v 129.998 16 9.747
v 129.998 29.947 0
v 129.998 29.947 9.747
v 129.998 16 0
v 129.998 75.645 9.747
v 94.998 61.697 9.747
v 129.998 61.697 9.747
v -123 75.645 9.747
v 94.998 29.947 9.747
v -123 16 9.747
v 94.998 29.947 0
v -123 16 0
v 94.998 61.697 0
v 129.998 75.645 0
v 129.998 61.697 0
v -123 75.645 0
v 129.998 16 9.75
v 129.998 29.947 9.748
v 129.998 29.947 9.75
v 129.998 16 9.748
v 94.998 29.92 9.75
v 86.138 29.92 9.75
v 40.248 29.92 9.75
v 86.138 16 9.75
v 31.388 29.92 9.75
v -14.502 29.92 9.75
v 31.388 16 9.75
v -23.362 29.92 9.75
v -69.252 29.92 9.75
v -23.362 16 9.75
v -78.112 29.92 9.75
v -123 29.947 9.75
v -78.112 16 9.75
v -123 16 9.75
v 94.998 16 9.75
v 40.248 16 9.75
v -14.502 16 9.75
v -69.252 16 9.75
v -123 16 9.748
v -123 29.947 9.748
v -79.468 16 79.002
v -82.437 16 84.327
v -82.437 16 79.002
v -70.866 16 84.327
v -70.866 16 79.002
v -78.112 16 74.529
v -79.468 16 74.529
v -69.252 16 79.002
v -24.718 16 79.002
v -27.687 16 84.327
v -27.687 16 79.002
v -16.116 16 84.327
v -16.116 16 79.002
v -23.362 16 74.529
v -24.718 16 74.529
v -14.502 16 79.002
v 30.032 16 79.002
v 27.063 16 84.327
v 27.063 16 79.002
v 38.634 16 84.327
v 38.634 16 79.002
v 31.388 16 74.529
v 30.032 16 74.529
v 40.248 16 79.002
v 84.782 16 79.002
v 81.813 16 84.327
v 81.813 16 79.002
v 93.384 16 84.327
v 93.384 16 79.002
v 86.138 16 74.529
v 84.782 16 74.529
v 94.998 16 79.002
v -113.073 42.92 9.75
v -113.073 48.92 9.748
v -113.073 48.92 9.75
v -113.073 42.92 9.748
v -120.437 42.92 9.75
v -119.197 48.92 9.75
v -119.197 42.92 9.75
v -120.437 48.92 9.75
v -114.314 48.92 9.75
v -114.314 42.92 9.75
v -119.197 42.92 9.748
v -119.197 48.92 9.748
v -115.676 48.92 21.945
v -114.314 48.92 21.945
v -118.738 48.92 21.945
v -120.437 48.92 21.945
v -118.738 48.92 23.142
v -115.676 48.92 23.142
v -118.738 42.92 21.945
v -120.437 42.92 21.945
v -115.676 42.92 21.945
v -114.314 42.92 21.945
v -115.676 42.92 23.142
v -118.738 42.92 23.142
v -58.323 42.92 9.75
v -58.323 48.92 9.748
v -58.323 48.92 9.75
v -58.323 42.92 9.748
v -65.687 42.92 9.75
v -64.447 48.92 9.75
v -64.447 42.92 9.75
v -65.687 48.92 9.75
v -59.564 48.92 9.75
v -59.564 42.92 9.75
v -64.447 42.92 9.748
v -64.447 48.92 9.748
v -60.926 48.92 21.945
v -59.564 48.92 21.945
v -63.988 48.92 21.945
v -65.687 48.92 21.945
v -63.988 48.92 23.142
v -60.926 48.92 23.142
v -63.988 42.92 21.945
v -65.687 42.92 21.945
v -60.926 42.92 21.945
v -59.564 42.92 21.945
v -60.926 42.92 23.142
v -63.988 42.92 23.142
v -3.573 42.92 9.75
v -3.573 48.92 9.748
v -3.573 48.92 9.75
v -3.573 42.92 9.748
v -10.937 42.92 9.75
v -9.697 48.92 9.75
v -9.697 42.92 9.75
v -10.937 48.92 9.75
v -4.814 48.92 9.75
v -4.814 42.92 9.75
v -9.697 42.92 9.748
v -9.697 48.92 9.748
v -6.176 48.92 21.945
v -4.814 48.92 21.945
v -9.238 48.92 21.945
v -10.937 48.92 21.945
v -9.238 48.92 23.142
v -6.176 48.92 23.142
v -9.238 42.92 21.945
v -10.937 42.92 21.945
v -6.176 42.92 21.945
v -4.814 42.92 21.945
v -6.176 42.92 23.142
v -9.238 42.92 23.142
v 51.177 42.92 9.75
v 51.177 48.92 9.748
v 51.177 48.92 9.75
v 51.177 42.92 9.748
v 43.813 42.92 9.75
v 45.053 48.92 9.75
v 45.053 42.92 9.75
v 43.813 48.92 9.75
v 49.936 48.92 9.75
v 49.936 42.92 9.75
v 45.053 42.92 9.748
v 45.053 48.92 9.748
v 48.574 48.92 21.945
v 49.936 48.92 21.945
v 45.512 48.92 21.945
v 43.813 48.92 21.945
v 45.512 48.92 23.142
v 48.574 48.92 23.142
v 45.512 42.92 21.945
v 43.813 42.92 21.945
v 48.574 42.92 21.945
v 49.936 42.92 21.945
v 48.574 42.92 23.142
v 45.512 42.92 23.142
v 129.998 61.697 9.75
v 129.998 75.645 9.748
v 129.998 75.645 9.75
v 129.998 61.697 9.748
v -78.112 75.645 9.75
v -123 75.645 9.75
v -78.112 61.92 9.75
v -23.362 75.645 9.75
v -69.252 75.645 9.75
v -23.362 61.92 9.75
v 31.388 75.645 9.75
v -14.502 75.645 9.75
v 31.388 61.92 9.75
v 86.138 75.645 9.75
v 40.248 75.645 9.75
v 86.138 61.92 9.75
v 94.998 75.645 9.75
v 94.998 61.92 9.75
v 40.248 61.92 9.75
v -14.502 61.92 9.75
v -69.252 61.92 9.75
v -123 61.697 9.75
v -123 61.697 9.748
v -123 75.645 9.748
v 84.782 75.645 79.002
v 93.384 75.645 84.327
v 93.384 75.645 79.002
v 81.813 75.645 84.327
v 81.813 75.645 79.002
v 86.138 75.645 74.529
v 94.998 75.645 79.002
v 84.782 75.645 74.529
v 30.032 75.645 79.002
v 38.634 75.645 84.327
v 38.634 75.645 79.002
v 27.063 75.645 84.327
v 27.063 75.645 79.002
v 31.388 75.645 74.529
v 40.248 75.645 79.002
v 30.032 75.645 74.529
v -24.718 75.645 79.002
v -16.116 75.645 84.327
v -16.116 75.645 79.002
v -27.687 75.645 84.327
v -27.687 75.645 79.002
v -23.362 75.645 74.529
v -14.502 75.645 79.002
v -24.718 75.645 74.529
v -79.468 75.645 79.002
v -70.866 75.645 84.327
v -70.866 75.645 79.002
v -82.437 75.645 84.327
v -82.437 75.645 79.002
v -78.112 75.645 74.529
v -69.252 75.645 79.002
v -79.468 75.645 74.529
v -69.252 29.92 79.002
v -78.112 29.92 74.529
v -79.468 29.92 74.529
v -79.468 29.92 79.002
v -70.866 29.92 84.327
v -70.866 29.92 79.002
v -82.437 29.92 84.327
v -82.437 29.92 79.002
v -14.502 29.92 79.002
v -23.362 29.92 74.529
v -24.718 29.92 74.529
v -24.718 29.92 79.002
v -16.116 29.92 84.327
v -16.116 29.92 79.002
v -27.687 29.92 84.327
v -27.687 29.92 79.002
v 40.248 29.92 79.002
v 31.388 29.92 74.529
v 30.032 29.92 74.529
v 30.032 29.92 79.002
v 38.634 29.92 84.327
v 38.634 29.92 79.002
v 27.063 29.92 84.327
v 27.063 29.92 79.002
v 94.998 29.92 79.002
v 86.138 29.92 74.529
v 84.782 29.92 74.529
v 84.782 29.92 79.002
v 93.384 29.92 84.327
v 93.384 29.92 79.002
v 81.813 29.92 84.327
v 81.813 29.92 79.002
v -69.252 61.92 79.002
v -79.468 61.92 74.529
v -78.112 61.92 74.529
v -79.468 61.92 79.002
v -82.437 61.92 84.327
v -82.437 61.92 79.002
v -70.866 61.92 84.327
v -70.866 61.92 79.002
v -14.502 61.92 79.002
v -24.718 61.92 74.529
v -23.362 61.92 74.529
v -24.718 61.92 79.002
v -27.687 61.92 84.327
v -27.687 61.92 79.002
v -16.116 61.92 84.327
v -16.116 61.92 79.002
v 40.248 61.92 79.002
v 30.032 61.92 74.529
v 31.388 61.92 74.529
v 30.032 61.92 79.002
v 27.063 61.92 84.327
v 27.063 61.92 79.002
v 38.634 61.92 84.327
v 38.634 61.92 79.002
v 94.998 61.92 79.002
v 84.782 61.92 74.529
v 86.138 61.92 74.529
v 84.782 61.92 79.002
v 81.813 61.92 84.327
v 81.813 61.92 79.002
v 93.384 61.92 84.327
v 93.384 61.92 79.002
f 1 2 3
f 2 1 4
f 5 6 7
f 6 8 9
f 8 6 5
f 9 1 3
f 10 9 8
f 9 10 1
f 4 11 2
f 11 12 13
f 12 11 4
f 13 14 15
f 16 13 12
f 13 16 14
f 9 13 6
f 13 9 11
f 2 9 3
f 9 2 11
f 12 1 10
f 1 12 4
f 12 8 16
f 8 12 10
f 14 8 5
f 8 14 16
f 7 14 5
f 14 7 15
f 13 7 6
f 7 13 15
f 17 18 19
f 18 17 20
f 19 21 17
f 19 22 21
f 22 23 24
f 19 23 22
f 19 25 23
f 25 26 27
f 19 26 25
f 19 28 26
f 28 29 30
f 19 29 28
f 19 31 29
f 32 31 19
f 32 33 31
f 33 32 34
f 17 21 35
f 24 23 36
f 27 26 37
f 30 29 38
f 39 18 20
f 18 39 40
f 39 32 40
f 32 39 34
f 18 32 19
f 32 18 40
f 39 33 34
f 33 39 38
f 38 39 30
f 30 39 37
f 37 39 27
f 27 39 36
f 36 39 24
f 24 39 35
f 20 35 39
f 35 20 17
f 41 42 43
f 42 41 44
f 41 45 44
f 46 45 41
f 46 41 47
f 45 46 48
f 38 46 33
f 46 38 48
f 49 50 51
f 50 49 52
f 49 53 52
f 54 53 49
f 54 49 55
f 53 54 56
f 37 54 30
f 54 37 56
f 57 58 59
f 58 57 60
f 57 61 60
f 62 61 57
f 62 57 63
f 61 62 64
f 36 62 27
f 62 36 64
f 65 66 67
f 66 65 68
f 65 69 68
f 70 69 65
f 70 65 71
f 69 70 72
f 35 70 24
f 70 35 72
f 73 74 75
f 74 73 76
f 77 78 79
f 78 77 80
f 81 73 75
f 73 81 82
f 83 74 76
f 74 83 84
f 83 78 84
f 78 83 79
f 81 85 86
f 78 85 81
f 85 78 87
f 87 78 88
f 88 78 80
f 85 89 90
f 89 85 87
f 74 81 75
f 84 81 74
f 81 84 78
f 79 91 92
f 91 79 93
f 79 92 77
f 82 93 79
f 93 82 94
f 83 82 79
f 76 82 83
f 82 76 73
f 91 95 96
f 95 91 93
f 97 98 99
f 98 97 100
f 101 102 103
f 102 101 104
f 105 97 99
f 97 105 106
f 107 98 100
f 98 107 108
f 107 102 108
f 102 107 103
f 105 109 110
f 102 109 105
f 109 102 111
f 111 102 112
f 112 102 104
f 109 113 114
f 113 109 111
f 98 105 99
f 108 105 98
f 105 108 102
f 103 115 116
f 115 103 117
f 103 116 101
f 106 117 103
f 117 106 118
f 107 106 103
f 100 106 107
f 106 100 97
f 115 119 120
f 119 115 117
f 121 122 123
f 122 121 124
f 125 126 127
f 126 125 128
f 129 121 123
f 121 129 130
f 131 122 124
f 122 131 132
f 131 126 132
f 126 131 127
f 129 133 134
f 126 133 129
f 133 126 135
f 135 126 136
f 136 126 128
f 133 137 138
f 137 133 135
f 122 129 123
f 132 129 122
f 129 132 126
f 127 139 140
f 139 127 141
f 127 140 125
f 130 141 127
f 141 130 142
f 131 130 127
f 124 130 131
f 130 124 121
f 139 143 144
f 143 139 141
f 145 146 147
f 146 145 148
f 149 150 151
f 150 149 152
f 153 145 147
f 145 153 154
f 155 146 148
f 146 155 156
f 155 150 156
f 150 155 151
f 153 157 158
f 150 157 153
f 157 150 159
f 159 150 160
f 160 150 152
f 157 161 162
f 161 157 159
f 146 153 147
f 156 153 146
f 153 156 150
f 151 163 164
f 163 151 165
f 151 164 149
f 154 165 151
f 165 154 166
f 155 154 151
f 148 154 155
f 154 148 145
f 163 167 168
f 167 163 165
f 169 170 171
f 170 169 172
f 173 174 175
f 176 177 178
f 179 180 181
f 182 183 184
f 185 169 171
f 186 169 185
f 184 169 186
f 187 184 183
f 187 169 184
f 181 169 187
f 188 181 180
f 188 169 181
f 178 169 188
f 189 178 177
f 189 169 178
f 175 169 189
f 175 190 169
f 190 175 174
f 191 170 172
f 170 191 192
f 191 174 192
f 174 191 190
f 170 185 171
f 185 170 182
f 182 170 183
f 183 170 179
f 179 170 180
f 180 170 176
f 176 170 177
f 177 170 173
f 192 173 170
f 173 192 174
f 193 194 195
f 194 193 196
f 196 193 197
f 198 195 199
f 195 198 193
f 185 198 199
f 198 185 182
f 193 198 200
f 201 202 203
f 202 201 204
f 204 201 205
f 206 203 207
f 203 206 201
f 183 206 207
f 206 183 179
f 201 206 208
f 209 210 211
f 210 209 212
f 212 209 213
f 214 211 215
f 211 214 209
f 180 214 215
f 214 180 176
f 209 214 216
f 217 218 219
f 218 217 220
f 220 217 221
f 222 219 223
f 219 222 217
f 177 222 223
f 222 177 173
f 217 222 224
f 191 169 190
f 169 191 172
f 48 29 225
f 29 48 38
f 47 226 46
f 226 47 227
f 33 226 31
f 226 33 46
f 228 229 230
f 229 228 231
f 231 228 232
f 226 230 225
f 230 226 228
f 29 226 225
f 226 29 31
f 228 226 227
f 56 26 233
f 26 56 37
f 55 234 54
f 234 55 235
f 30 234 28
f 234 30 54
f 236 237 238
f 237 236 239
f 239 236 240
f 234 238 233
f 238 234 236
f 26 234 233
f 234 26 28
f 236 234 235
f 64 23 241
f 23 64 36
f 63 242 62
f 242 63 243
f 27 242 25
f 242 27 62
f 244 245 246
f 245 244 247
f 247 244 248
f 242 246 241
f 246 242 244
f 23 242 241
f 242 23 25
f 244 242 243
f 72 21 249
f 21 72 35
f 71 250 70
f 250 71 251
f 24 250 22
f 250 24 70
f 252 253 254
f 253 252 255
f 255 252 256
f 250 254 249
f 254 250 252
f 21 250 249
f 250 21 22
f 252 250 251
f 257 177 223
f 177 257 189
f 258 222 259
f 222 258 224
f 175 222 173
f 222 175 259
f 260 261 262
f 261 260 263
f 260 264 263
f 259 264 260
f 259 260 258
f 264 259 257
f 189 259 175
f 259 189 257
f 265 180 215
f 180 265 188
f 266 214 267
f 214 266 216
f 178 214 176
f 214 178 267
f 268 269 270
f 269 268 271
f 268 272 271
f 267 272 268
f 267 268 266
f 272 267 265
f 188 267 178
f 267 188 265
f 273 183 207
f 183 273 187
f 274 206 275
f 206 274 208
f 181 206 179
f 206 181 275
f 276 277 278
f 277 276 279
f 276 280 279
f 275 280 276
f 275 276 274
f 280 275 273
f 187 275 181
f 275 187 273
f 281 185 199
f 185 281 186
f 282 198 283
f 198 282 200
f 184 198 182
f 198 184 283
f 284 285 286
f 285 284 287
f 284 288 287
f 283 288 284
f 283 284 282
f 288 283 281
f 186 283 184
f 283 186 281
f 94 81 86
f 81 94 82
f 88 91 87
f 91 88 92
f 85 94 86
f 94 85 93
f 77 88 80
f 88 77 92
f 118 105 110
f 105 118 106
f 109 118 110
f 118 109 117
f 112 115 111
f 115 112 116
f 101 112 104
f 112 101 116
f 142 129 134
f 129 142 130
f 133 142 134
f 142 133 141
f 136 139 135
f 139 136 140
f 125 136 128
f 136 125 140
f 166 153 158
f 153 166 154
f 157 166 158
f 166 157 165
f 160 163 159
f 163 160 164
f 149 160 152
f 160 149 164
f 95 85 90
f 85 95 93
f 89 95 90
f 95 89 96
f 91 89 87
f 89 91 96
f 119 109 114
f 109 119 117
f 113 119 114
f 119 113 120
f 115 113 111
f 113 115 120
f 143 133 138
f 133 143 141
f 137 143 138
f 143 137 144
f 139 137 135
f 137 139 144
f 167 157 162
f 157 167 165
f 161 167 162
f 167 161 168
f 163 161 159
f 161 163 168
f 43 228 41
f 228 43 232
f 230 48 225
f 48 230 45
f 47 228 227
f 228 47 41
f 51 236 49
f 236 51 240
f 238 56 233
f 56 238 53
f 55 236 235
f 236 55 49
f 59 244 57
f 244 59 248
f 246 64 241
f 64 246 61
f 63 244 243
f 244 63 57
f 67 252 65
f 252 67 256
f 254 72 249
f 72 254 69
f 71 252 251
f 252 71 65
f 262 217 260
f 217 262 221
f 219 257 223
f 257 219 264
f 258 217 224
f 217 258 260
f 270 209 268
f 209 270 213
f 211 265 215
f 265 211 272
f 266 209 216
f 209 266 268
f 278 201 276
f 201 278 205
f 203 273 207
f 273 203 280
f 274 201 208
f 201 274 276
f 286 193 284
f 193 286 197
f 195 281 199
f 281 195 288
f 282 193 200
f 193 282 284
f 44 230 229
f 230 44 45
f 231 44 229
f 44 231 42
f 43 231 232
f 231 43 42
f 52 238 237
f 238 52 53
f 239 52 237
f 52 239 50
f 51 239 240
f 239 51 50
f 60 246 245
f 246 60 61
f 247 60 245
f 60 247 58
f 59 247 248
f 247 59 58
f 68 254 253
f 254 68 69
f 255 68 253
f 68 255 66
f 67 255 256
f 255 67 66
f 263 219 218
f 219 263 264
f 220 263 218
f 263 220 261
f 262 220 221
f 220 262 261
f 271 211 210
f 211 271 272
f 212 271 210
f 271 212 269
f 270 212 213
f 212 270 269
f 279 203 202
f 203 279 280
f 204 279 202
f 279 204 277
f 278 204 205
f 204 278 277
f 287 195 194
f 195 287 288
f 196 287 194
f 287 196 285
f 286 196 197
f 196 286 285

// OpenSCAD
// Parameterized version of top_rect_cubes_simplified_jay.scad
// Parameters:
//   width: overall X width (in the same units as the original model)
//   arm_gap: gap in Y between the two arms
//
// Implementation notes:
// - Geometry is identical to the source when width=252.997994 and arm_gap=31.750000
// - All X coordinates >= _x_split are shifted by (width - _width_orig)
// - All Y coordinates >= _y_back_start are shifted by (arm_gap - _arm_gap_orig)

width = 252.997994;
arm_gap = 31.750000;

// --- Reference constants (from source file) ---
_x_min = -123.000008;
_x_split = 94.997986;
_width_orig = 252.997994;

_y_back_start = 61.696999;
_arm_gap_orig = 31.750000;

function map_x(x) = (x < _x_split) ? x : (x + (width - _width_orig));
function map_y(y) = (y < _y_back_start) ? y : (y + (arm_gap - _arm_gap_orig));

module rect_prism_m(x1,y1,x2,y2,z0,h){
  translate([map_x(x1), map_y(y1), z0])
    cube([map_x(x2)-map_x(x1), map_y(y2)-map_y(y1), h], center=false);
}


// Rewritten from layered polygon rebuild into rectilinear cubes
// Each slab is decomposed into axis-aligned rectangles and emitted as cubes.
// Note: This preserves orthogonal geometry; curved/diagonal features (if any) are approximated.

//module rect_prism_m(x1,y1,x2,y2,z0,h){
//  translate([x1,y1,z0]) cube([x2-x1, y2-y1, h], //center=false);
//}

module slab_1() {
  union() {
    rect_prism_m(94.997986,15.999999,129.997986,29.946999,0,9.747);
    rect_prism_m(-123.000008,15.999999,94.997986,75.644997,0,9.747);
    rect_prism_m(94.997986,61.696999,129.997986,75.644997,0,9.747);
  }
}

module slab_2() {
  union() {
    rect_prism_m(-123.000008,15.999999,129.997986,29.946999,9.748,0.002);
    rect_prism_m(-119.196615,42.919998,-113.073431,48.919998,9.748,0.002);
    rect_prism_m(-64.44663,42.919998,-58.323427,48.919998,9.748,0.002);
    rect_prism_m(-9.696628,42.919998,-3.573428,48.919998,9.748,0.002);
    rect_prism_m(45.053381,42.919998,51.176573,48.919998,9.748,0.002);
    rect_prism_m(-123.000008,61.696999,129.997986,75.644997,9.748,0.002);
  }
}

module slab_3_4_5() {
  // Consolidated: slabs 3, 4, and 5 were contiguous in Z and largely repeated.
  // This version merges the eight vertical posts into single prisms and keeps the two brace bands.
  union() {
    // Vertical posts (merged height: 64.779)
    rect_prism_m(-78.112015,15.999999,-69.252014,29.919998,9.750000,64.779000);
    rect_prism_m(-23.362015,15.999999,-14.502014,29.919998,9.750000,64.779000);
    rect_prism_m(31.387985,15.999999,40.247986,29.919998,9.750000,64.779000);
    rect_prism_m(86.137985,15.999999,94.997986,29.919998,9.750000,64.779000);
    rect_prism_m(-78.112015,61.919998,-69.252014,75.644997,9.750000,64.779000);
    rect_prism_m(-23.362015,61.919998,-14.502014,75.644997,9.750000,64.779000);
    rect_prism_m(31.387985,61.919998,40.247986,75.644997,9.750000,64.779000);
    rect_prism_m(86.137985,61.919998,94.997986,75.644997,9.750000,64.779000);

    // Lower brace band (wider)
    rect_prism_m(-120.437410,42.919998,-114.314075,48.919998,9.750000,12.195000);
    rect_prism_m(-65.687418,42.919998,-59.564071,48.919998,9.750000,12.195000);
    rect_prism_m(-10.937418,42.919998,-4.814072,48.919998,9.750000,12.195000);
    rect_prism_m(43.812582,42.919998,49.935932,48.919998,9.750000,12.195000);

    // Upper thin brace band (narrower)
    rect_prism_m(-118.738005,42.919998,-115.676272,48.919998,21.945000,1.197000);
    rect_prism_m(-63.988003,42.919998,-60.926268,48.919998,21.945000,1.197000);
    rect_prism_m(-9.238005,42.919998,-6.176269,48.919998,21.945000,1.197000);
    rect_prism_m(45.511995,42.919998,48.573739,48.919998,21.945000,1.197000);
  }
}




module slab_6() {
  union() {
    rect_prism_m(-79.467536,15.999999,-69.252014,29.919998,74.529,4.4726);
    rect_prism_m(-24.717536,15.999999,-14.502014,29.919998,74.529,4.4726);
    rect_prism_m(30.032464,15.999999,40.247986,29.919998,74.529,4.4726);
    rect_prism_m(84.782464,15.999999,94.997986,29.919998,74.529,4.4726);
    rect_prism_m(-79.467536,61.919998,-69.252014,75.644997,74.529,4.4726);
    rect_prism_m(-24.717536,61.919998,-14.502014,75.644997,74.529,4.4726);
    rect_prism_m(30.032464,61.919998,40.247986,75.644997,74.529,4.4726);
    rect_prism_m(84.782464,61.919998,94.997986,75.644997,74.529,4.4726);
  }
}

module slab_7() {
  union() {
    rect_prism_m(-82.437039,15.999999,-70.865755,29.919998,79.0016,5.3254);
    rect_prism_m(-27.687036,15.999999,-16.115755,29.919998,79.0016,5.3254);
    rect_prism_m(27.062964,15.999999,38.634246,29.919998,79.0016,5.3254);
    rect_prism_m(81.812961,15.999999,93.384242,29.919998,79.0016,5.3254);
    rect_prism_m(-82.437039,61.919998,-70.865755,75.644997,79.0016,5.3254);
    rect_prism_m(-27.687036,61.919998,-16.115755,75.644997,79.0016,5.3254);
    rect_prism_m(27.062964,61.919998,38.634246,75.644997,79.0016,5.3254);
    rect_prism_m(81.812961,61.919998,93.384242,75.644997,79.0016,5.3254);
  }
}

module top() {
  union() {
    slab_1();
    slab_2();  
    slab_3_4_5();
    slab_6();
    slab_7();
  }
}

top();
